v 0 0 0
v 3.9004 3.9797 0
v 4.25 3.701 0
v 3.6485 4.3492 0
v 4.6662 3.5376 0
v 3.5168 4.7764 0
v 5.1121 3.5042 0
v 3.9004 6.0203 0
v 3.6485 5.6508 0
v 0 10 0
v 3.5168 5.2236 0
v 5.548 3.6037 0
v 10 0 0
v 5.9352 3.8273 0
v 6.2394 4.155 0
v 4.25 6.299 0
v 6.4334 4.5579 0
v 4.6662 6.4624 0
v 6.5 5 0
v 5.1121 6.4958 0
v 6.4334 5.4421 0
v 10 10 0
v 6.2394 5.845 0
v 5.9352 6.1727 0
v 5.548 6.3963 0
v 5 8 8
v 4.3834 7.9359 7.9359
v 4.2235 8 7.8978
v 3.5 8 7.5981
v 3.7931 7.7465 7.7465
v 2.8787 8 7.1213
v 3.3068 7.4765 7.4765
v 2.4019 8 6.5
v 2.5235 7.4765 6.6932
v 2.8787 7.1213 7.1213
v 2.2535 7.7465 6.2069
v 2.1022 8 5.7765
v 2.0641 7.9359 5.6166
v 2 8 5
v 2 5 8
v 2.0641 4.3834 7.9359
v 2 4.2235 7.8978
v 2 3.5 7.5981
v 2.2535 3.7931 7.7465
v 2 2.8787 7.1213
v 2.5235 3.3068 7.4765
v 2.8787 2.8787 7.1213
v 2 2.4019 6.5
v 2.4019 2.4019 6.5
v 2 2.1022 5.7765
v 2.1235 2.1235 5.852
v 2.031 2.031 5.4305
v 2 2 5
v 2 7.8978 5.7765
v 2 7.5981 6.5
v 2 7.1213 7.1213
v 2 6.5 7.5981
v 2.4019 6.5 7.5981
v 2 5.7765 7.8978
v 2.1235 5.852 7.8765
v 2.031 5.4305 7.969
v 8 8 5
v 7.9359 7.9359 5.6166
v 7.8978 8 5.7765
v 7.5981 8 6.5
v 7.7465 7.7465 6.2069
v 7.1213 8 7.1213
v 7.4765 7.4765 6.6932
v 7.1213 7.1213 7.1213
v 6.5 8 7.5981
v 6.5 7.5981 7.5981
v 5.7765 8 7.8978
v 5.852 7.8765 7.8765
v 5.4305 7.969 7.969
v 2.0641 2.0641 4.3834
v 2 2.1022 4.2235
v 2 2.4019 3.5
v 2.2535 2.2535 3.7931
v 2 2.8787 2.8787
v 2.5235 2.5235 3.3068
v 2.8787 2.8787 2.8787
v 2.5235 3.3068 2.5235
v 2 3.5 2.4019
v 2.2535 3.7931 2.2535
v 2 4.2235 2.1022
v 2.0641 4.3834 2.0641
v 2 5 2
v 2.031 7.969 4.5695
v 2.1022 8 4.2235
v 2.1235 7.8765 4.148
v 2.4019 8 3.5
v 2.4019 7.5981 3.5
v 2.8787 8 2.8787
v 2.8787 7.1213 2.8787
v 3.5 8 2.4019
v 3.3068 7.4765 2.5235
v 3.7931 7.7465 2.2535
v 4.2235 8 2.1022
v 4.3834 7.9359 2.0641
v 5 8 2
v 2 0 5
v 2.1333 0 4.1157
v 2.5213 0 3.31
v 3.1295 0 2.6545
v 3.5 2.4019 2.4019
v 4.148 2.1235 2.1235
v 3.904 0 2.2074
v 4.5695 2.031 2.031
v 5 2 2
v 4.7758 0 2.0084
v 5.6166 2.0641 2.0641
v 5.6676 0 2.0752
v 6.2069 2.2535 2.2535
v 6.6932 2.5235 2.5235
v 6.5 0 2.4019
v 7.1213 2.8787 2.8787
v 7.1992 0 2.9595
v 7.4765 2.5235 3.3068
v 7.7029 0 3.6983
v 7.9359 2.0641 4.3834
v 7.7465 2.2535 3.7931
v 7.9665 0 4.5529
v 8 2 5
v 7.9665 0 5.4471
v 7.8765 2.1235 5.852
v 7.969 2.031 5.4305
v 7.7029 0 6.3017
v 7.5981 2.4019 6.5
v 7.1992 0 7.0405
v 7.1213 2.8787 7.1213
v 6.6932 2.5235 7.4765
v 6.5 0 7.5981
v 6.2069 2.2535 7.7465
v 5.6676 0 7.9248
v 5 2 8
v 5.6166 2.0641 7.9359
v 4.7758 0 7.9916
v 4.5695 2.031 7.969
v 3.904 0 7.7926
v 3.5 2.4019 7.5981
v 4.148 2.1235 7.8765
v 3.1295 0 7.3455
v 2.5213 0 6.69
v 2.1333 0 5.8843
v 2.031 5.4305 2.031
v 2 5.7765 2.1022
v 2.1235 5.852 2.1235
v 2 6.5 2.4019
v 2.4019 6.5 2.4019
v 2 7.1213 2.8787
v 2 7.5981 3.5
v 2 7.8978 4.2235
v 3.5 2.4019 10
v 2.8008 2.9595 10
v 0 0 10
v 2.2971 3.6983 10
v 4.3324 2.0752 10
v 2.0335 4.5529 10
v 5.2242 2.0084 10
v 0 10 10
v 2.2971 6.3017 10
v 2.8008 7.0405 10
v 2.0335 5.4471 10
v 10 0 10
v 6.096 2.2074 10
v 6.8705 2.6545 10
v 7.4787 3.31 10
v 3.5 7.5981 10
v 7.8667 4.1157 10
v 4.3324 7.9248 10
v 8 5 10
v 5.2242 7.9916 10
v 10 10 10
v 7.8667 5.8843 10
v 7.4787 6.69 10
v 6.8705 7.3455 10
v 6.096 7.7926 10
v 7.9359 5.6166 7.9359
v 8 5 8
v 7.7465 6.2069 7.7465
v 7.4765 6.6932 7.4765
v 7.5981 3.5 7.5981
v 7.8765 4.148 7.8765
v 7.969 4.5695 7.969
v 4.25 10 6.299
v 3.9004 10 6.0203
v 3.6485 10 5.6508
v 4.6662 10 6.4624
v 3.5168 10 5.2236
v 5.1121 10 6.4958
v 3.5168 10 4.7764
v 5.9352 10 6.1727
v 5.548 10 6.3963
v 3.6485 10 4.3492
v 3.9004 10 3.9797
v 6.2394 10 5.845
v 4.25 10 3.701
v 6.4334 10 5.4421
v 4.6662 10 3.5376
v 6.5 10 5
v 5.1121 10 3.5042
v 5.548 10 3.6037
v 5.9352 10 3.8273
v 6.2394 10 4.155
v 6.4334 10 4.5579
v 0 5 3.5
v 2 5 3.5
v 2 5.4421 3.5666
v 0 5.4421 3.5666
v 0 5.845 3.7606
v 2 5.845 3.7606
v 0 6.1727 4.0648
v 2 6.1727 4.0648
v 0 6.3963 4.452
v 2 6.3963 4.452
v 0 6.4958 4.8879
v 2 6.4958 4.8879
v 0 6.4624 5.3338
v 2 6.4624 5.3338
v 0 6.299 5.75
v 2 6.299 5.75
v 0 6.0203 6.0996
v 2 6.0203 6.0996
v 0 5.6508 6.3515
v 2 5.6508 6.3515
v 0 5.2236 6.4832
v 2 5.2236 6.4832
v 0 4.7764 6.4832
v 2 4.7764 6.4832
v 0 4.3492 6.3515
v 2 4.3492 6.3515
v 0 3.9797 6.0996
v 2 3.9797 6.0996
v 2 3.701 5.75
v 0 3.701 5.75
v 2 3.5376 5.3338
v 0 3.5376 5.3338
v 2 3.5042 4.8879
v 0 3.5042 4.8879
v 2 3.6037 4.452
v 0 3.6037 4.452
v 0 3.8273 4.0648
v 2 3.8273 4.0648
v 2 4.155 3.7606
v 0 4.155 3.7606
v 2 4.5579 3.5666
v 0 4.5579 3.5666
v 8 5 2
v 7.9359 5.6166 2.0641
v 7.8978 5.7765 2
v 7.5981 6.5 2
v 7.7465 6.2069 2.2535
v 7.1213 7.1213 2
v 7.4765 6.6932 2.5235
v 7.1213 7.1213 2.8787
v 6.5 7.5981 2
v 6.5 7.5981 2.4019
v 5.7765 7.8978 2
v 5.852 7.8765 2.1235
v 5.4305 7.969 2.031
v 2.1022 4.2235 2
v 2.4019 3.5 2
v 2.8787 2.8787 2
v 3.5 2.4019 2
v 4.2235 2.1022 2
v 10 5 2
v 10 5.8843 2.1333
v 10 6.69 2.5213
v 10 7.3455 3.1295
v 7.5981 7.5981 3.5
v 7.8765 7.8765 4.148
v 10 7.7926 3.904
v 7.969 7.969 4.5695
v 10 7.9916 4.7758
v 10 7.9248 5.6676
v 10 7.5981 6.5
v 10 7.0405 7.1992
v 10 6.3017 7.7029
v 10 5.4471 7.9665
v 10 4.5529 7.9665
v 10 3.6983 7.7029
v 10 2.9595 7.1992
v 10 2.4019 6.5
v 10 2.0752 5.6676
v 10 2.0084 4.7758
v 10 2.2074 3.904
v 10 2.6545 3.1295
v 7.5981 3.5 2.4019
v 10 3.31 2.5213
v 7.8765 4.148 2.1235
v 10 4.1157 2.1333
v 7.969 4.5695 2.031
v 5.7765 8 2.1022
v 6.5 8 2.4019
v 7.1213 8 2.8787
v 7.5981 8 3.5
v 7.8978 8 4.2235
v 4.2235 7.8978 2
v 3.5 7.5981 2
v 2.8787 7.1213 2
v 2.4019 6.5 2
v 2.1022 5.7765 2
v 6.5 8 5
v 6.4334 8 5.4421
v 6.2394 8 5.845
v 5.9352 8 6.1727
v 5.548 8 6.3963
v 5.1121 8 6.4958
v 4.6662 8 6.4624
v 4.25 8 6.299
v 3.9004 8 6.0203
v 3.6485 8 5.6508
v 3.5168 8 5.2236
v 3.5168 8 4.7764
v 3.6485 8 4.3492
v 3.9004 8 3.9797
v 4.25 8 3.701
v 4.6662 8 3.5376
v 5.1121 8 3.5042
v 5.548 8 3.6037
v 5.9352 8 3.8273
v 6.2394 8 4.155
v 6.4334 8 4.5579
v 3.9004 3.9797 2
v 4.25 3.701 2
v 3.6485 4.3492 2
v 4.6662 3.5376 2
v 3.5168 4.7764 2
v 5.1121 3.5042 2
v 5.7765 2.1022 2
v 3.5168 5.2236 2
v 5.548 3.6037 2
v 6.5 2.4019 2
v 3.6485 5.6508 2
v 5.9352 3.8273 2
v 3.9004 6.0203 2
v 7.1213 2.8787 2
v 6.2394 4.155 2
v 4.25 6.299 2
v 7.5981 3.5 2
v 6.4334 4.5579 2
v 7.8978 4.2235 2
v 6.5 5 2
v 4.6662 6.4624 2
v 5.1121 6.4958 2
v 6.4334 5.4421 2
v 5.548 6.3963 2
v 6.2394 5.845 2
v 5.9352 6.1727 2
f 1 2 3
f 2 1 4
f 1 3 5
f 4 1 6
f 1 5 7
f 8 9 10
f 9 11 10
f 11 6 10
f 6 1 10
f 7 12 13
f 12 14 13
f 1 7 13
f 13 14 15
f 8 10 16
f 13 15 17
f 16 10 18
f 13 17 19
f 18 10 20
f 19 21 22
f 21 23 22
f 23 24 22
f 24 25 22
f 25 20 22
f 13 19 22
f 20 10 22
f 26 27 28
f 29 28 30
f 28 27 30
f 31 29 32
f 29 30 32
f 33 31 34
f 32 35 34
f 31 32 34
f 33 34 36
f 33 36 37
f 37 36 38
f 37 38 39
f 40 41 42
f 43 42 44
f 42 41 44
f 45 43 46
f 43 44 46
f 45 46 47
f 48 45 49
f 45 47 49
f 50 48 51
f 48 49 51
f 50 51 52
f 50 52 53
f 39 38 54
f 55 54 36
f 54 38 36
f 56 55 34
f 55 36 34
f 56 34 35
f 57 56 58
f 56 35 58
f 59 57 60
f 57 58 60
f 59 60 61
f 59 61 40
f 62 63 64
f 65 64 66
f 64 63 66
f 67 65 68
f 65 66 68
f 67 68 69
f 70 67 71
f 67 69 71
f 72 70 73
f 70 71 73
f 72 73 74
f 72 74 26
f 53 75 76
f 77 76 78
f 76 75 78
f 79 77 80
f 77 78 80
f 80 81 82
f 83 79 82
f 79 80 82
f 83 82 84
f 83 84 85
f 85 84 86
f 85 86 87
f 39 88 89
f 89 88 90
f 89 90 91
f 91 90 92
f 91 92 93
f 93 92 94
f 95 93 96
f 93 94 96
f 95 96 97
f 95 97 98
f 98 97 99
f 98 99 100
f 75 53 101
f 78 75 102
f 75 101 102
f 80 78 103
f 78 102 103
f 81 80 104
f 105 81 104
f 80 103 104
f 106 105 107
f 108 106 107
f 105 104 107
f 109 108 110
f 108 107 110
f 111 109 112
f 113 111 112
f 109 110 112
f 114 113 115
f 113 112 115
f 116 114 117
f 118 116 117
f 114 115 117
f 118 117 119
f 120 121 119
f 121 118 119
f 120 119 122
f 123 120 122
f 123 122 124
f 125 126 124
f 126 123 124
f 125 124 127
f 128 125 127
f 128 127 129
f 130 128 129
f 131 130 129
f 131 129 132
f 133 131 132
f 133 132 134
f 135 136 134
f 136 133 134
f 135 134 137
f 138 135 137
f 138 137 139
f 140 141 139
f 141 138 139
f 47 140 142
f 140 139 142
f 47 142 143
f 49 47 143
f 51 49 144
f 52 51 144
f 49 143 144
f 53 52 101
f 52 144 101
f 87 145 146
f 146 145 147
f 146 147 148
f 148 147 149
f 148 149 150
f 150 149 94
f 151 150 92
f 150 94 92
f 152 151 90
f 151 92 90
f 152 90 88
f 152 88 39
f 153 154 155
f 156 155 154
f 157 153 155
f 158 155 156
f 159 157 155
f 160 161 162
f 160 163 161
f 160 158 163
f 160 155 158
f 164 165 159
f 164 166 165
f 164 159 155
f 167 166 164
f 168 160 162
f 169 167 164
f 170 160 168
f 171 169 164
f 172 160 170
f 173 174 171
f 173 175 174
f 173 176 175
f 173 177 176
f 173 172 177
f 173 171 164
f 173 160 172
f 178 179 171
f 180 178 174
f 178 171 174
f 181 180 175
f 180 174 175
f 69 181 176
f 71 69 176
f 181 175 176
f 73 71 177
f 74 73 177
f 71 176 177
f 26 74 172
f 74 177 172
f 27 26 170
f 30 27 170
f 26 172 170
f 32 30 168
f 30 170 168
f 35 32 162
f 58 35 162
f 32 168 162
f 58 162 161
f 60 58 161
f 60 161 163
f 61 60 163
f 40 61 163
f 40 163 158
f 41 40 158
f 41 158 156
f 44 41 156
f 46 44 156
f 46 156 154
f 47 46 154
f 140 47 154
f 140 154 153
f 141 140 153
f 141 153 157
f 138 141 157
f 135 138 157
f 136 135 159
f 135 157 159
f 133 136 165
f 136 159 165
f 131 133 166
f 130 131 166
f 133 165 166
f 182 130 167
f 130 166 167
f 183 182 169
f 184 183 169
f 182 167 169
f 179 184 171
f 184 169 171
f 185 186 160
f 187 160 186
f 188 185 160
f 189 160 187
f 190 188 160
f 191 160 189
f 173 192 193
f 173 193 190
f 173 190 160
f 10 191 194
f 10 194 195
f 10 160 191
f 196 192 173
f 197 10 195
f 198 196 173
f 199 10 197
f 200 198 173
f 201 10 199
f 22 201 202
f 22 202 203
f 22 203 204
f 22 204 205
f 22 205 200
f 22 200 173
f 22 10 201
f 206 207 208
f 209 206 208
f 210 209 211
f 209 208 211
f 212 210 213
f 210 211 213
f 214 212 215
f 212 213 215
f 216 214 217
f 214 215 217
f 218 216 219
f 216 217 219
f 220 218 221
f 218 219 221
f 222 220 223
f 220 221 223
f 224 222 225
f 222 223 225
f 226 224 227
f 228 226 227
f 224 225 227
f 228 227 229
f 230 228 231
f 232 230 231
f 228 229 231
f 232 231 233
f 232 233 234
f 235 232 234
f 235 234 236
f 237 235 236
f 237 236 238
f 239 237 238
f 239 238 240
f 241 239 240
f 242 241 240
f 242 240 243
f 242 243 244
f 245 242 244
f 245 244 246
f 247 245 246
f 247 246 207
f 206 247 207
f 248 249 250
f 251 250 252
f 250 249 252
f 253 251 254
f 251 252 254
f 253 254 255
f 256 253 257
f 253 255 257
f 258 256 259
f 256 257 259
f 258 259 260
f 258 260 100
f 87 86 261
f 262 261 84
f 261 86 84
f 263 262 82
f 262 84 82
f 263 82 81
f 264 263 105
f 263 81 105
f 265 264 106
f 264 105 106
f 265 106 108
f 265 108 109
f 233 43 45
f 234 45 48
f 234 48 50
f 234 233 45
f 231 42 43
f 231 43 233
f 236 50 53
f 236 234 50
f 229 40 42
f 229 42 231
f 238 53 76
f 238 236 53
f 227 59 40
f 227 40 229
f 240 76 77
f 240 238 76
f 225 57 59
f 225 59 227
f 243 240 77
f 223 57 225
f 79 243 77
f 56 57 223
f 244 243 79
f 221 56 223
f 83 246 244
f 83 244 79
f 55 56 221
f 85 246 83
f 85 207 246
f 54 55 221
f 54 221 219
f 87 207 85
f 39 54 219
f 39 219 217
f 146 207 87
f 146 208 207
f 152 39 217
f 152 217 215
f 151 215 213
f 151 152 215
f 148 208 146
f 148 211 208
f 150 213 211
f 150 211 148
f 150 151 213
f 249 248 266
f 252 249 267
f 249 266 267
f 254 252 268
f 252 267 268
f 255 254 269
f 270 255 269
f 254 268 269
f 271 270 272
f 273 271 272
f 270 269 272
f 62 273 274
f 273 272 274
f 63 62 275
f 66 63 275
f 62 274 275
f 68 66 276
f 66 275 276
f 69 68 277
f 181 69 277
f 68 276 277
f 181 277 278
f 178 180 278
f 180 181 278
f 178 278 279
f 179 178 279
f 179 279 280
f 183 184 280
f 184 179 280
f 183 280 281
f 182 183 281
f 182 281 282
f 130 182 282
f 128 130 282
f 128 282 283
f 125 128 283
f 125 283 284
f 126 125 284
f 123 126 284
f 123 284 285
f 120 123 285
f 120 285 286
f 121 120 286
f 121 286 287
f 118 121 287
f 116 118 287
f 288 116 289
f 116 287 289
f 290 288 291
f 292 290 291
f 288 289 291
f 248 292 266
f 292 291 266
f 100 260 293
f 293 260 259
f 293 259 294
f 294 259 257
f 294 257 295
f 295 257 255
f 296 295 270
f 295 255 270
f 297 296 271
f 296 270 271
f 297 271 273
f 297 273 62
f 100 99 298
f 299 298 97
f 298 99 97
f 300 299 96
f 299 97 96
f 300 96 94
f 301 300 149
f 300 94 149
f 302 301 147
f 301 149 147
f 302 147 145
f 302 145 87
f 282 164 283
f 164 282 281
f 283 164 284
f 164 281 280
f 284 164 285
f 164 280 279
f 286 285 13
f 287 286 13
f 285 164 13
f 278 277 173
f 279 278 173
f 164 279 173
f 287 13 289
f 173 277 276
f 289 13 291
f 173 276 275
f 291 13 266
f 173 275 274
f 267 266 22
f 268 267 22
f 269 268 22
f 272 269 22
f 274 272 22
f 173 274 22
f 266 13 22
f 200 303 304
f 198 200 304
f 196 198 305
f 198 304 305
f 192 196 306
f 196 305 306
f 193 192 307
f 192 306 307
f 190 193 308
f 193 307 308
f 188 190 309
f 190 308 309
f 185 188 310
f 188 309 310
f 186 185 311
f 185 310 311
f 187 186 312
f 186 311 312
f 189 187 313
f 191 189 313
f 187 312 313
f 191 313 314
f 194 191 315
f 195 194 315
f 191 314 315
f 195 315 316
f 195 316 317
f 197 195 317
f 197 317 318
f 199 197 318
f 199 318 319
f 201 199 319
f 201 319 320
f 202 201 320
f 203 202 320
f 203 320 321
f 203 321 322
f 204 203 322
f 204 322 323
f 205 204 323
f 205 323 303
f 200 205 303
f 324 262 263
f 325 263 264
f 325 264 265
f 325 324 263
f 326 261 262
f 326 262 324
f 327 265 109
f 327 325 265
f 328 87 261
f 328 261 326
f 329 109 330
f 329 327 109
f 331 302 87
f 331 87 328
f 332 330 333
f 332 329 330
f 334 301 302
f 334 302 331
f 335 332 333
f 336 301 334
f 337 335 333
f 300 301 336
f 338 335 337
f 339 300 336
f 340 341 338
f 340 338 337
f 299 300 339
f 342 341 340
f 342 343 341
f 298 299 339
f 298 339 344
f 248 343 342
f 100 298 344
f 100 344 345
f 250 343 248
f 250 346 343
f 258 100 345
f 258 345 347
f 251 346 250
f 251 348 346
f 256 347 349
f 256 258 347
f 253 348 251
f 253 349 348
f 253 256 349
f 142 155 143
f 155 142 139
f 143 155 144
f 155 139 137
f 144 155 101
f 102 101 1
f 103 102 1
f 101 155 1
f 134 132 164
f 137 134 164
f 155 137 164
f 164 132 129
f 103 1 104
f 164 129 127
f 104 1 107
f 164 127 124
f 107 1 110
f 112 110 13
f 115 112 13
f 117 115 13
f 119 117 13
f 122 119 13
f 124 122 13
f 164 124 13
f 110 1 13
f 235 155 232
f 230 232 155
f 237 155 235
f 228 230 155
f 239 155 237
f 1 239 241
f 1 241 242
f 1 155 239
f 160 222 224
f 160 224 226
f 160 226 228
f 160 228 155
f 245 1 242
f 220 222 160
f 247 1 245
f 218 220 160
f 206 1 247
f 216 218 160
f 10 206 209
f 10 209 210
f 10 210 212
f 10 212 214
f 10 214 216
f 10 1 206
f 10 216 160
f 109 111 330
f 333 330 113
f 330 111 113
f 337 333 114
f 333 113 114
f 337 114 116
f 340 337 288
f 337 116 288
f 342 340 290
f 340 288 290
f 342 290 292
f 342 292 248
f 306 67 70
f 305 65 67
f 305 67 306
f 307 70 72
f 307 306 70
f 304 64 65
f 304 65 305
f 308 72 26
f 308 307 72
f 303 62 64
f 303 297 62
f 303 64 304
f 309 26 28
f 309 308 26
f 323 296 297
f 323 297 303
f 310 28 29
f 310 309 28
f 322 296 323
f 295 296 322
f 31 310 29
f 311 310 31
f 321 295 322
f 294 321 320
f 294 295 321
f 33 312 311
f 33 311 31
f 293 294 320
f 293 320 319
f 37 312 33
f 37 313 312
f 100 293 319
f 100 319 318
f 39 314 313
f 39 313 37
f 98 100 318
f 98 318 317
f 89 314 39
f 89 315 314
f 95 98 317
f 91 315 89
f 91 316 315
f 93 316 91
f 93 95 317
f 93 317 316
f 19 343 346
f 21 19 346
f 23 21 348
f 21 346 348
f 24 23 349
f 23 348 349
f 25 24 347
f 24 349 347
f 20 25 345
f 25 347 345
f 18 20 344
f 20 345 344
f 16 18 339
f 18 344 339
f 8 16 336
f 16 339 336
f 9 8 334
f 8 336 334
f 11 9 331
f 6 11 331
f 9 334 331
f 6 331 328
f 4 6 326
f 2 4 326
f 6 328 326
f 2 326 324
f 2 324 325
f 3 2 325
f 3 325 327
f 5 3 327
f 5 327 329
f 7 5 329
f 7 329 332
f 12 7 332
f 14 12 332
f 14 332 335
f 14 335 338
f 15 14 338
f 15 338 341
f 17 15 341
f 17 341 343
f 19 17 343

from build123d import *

# Parameters (mm, degrees)
ESQUISSE1_W             = 10
ESQUISSE1_H             = 10
BOSS_EXTRU_1_DEPTH      = 10
ESQUISSE2_R             = 1.5
ENL_V_MAT_EXTRU_1_DEPTH = 11
ESQUISSE3_R             = 3
ENL_V_MAT_EXTRU_2_DEPTH = 8
ESQUISSE4_R             = 1.5
ENL_V_MAT_EXTRU_3_DEPTH = 11
ESQUISSE5_R             = 3
ENL_V_MAT_EXTRU_4_DEPTH = 8
ESQUISSE6_R             = 1.5
ENL_V_MAT_EXTRU_5_DEPTH = 11
ESQUISSE7_R             = 3
ENL_V_MAT_EXTRU_6_DEPTH = 8


with BuildPart() as part:
    # Esquisse1 → Boss.-Extru.1 (new body)
    with BuildSketch(Plane.XY):
        with Locations((5, 5)):
            Rectangle(ESQUISSE1_W, ESQUISSE1_H)
    extrude(amount=BOSS_EXTRU_1_DEPTH)

    # Esquisse2 → Enlèv. mat.-Extru.1 (cut, through all)
    with BuildSketch(Plane.XY.offset(10)):
        with Locations((5, 5)):
            Circle(ESQUISSE2_R)
    extrude(amount=-ENL_V_MAT_EXTRU_1_DEPTH, mode=Mode.SUBTRACT)

    # Esquisse3 → Enlèv. mat.-Extru.2 (cut)
    with BuildSketch(Plane.XY.offset(10)):
        with Locations((5, 5)):
            Circle(ESQUISSE3_R)
    extrude(amount=-ENL_V_MAT_EXTRU_2_DEPTH, mode=Mode.SUBTRACT)

    # Esquisse4 → Enlèv. mat.-Extru.3 (cut, through all)
    with BuildSketch(Plane(origin=(10, 0, 0), x_dir=(0, 0, -1), z_dir=(1, 0, 0))):
        with Locations((-5, 5)):
            Circle(ESQUISSE4_R)
    extrude(amount=-ENL_V_MAT_EXTRU_3_DEPTH, mode=Mode.SUBTRACT)

    # Esquisse5 → Enlèv. mat.-Extru.4 (cut)
    with BuildSketch(Plane(origin=(10, 0, 0), x_dir=(0, 0, -1), z_dir=(1, 0, 0))):
        with Locations((-5, 5)):
            Circle(ESQUISSE5_R)
    extrude(amount=-ENL_V_MAT_EXTRU_4_DEPTH, mode=Mode.SUBTRACT)

    # Esquisse6 → Enlèv. mat.-Extru.5 (cut, through all)
    with BuildSketch(Plane.XZ):
        with Locations((5, 5)):
            Circle(ESQUISSE6_R)
    extrude(amount=-ENL_V_MAT_EXTRU_5_DEPTH, mode=Mode.SUBTRACT)

    # Esquisse7 → Enlèv. mat.-Extru.6 (cut)
    with BuildSketch(Plane(origin=(0, 0, 0), x_dir=(-1, 0, 0), z_dir=(0, -1, 0))):
        with Locations((-5, -5)):
            Circle(ESQUISSE7_R)
    extrude(amount=-ENL_V_MAT_EXTRU_6_DEPTH, mode=Mode.SUBTRACT)


solid = part.part
